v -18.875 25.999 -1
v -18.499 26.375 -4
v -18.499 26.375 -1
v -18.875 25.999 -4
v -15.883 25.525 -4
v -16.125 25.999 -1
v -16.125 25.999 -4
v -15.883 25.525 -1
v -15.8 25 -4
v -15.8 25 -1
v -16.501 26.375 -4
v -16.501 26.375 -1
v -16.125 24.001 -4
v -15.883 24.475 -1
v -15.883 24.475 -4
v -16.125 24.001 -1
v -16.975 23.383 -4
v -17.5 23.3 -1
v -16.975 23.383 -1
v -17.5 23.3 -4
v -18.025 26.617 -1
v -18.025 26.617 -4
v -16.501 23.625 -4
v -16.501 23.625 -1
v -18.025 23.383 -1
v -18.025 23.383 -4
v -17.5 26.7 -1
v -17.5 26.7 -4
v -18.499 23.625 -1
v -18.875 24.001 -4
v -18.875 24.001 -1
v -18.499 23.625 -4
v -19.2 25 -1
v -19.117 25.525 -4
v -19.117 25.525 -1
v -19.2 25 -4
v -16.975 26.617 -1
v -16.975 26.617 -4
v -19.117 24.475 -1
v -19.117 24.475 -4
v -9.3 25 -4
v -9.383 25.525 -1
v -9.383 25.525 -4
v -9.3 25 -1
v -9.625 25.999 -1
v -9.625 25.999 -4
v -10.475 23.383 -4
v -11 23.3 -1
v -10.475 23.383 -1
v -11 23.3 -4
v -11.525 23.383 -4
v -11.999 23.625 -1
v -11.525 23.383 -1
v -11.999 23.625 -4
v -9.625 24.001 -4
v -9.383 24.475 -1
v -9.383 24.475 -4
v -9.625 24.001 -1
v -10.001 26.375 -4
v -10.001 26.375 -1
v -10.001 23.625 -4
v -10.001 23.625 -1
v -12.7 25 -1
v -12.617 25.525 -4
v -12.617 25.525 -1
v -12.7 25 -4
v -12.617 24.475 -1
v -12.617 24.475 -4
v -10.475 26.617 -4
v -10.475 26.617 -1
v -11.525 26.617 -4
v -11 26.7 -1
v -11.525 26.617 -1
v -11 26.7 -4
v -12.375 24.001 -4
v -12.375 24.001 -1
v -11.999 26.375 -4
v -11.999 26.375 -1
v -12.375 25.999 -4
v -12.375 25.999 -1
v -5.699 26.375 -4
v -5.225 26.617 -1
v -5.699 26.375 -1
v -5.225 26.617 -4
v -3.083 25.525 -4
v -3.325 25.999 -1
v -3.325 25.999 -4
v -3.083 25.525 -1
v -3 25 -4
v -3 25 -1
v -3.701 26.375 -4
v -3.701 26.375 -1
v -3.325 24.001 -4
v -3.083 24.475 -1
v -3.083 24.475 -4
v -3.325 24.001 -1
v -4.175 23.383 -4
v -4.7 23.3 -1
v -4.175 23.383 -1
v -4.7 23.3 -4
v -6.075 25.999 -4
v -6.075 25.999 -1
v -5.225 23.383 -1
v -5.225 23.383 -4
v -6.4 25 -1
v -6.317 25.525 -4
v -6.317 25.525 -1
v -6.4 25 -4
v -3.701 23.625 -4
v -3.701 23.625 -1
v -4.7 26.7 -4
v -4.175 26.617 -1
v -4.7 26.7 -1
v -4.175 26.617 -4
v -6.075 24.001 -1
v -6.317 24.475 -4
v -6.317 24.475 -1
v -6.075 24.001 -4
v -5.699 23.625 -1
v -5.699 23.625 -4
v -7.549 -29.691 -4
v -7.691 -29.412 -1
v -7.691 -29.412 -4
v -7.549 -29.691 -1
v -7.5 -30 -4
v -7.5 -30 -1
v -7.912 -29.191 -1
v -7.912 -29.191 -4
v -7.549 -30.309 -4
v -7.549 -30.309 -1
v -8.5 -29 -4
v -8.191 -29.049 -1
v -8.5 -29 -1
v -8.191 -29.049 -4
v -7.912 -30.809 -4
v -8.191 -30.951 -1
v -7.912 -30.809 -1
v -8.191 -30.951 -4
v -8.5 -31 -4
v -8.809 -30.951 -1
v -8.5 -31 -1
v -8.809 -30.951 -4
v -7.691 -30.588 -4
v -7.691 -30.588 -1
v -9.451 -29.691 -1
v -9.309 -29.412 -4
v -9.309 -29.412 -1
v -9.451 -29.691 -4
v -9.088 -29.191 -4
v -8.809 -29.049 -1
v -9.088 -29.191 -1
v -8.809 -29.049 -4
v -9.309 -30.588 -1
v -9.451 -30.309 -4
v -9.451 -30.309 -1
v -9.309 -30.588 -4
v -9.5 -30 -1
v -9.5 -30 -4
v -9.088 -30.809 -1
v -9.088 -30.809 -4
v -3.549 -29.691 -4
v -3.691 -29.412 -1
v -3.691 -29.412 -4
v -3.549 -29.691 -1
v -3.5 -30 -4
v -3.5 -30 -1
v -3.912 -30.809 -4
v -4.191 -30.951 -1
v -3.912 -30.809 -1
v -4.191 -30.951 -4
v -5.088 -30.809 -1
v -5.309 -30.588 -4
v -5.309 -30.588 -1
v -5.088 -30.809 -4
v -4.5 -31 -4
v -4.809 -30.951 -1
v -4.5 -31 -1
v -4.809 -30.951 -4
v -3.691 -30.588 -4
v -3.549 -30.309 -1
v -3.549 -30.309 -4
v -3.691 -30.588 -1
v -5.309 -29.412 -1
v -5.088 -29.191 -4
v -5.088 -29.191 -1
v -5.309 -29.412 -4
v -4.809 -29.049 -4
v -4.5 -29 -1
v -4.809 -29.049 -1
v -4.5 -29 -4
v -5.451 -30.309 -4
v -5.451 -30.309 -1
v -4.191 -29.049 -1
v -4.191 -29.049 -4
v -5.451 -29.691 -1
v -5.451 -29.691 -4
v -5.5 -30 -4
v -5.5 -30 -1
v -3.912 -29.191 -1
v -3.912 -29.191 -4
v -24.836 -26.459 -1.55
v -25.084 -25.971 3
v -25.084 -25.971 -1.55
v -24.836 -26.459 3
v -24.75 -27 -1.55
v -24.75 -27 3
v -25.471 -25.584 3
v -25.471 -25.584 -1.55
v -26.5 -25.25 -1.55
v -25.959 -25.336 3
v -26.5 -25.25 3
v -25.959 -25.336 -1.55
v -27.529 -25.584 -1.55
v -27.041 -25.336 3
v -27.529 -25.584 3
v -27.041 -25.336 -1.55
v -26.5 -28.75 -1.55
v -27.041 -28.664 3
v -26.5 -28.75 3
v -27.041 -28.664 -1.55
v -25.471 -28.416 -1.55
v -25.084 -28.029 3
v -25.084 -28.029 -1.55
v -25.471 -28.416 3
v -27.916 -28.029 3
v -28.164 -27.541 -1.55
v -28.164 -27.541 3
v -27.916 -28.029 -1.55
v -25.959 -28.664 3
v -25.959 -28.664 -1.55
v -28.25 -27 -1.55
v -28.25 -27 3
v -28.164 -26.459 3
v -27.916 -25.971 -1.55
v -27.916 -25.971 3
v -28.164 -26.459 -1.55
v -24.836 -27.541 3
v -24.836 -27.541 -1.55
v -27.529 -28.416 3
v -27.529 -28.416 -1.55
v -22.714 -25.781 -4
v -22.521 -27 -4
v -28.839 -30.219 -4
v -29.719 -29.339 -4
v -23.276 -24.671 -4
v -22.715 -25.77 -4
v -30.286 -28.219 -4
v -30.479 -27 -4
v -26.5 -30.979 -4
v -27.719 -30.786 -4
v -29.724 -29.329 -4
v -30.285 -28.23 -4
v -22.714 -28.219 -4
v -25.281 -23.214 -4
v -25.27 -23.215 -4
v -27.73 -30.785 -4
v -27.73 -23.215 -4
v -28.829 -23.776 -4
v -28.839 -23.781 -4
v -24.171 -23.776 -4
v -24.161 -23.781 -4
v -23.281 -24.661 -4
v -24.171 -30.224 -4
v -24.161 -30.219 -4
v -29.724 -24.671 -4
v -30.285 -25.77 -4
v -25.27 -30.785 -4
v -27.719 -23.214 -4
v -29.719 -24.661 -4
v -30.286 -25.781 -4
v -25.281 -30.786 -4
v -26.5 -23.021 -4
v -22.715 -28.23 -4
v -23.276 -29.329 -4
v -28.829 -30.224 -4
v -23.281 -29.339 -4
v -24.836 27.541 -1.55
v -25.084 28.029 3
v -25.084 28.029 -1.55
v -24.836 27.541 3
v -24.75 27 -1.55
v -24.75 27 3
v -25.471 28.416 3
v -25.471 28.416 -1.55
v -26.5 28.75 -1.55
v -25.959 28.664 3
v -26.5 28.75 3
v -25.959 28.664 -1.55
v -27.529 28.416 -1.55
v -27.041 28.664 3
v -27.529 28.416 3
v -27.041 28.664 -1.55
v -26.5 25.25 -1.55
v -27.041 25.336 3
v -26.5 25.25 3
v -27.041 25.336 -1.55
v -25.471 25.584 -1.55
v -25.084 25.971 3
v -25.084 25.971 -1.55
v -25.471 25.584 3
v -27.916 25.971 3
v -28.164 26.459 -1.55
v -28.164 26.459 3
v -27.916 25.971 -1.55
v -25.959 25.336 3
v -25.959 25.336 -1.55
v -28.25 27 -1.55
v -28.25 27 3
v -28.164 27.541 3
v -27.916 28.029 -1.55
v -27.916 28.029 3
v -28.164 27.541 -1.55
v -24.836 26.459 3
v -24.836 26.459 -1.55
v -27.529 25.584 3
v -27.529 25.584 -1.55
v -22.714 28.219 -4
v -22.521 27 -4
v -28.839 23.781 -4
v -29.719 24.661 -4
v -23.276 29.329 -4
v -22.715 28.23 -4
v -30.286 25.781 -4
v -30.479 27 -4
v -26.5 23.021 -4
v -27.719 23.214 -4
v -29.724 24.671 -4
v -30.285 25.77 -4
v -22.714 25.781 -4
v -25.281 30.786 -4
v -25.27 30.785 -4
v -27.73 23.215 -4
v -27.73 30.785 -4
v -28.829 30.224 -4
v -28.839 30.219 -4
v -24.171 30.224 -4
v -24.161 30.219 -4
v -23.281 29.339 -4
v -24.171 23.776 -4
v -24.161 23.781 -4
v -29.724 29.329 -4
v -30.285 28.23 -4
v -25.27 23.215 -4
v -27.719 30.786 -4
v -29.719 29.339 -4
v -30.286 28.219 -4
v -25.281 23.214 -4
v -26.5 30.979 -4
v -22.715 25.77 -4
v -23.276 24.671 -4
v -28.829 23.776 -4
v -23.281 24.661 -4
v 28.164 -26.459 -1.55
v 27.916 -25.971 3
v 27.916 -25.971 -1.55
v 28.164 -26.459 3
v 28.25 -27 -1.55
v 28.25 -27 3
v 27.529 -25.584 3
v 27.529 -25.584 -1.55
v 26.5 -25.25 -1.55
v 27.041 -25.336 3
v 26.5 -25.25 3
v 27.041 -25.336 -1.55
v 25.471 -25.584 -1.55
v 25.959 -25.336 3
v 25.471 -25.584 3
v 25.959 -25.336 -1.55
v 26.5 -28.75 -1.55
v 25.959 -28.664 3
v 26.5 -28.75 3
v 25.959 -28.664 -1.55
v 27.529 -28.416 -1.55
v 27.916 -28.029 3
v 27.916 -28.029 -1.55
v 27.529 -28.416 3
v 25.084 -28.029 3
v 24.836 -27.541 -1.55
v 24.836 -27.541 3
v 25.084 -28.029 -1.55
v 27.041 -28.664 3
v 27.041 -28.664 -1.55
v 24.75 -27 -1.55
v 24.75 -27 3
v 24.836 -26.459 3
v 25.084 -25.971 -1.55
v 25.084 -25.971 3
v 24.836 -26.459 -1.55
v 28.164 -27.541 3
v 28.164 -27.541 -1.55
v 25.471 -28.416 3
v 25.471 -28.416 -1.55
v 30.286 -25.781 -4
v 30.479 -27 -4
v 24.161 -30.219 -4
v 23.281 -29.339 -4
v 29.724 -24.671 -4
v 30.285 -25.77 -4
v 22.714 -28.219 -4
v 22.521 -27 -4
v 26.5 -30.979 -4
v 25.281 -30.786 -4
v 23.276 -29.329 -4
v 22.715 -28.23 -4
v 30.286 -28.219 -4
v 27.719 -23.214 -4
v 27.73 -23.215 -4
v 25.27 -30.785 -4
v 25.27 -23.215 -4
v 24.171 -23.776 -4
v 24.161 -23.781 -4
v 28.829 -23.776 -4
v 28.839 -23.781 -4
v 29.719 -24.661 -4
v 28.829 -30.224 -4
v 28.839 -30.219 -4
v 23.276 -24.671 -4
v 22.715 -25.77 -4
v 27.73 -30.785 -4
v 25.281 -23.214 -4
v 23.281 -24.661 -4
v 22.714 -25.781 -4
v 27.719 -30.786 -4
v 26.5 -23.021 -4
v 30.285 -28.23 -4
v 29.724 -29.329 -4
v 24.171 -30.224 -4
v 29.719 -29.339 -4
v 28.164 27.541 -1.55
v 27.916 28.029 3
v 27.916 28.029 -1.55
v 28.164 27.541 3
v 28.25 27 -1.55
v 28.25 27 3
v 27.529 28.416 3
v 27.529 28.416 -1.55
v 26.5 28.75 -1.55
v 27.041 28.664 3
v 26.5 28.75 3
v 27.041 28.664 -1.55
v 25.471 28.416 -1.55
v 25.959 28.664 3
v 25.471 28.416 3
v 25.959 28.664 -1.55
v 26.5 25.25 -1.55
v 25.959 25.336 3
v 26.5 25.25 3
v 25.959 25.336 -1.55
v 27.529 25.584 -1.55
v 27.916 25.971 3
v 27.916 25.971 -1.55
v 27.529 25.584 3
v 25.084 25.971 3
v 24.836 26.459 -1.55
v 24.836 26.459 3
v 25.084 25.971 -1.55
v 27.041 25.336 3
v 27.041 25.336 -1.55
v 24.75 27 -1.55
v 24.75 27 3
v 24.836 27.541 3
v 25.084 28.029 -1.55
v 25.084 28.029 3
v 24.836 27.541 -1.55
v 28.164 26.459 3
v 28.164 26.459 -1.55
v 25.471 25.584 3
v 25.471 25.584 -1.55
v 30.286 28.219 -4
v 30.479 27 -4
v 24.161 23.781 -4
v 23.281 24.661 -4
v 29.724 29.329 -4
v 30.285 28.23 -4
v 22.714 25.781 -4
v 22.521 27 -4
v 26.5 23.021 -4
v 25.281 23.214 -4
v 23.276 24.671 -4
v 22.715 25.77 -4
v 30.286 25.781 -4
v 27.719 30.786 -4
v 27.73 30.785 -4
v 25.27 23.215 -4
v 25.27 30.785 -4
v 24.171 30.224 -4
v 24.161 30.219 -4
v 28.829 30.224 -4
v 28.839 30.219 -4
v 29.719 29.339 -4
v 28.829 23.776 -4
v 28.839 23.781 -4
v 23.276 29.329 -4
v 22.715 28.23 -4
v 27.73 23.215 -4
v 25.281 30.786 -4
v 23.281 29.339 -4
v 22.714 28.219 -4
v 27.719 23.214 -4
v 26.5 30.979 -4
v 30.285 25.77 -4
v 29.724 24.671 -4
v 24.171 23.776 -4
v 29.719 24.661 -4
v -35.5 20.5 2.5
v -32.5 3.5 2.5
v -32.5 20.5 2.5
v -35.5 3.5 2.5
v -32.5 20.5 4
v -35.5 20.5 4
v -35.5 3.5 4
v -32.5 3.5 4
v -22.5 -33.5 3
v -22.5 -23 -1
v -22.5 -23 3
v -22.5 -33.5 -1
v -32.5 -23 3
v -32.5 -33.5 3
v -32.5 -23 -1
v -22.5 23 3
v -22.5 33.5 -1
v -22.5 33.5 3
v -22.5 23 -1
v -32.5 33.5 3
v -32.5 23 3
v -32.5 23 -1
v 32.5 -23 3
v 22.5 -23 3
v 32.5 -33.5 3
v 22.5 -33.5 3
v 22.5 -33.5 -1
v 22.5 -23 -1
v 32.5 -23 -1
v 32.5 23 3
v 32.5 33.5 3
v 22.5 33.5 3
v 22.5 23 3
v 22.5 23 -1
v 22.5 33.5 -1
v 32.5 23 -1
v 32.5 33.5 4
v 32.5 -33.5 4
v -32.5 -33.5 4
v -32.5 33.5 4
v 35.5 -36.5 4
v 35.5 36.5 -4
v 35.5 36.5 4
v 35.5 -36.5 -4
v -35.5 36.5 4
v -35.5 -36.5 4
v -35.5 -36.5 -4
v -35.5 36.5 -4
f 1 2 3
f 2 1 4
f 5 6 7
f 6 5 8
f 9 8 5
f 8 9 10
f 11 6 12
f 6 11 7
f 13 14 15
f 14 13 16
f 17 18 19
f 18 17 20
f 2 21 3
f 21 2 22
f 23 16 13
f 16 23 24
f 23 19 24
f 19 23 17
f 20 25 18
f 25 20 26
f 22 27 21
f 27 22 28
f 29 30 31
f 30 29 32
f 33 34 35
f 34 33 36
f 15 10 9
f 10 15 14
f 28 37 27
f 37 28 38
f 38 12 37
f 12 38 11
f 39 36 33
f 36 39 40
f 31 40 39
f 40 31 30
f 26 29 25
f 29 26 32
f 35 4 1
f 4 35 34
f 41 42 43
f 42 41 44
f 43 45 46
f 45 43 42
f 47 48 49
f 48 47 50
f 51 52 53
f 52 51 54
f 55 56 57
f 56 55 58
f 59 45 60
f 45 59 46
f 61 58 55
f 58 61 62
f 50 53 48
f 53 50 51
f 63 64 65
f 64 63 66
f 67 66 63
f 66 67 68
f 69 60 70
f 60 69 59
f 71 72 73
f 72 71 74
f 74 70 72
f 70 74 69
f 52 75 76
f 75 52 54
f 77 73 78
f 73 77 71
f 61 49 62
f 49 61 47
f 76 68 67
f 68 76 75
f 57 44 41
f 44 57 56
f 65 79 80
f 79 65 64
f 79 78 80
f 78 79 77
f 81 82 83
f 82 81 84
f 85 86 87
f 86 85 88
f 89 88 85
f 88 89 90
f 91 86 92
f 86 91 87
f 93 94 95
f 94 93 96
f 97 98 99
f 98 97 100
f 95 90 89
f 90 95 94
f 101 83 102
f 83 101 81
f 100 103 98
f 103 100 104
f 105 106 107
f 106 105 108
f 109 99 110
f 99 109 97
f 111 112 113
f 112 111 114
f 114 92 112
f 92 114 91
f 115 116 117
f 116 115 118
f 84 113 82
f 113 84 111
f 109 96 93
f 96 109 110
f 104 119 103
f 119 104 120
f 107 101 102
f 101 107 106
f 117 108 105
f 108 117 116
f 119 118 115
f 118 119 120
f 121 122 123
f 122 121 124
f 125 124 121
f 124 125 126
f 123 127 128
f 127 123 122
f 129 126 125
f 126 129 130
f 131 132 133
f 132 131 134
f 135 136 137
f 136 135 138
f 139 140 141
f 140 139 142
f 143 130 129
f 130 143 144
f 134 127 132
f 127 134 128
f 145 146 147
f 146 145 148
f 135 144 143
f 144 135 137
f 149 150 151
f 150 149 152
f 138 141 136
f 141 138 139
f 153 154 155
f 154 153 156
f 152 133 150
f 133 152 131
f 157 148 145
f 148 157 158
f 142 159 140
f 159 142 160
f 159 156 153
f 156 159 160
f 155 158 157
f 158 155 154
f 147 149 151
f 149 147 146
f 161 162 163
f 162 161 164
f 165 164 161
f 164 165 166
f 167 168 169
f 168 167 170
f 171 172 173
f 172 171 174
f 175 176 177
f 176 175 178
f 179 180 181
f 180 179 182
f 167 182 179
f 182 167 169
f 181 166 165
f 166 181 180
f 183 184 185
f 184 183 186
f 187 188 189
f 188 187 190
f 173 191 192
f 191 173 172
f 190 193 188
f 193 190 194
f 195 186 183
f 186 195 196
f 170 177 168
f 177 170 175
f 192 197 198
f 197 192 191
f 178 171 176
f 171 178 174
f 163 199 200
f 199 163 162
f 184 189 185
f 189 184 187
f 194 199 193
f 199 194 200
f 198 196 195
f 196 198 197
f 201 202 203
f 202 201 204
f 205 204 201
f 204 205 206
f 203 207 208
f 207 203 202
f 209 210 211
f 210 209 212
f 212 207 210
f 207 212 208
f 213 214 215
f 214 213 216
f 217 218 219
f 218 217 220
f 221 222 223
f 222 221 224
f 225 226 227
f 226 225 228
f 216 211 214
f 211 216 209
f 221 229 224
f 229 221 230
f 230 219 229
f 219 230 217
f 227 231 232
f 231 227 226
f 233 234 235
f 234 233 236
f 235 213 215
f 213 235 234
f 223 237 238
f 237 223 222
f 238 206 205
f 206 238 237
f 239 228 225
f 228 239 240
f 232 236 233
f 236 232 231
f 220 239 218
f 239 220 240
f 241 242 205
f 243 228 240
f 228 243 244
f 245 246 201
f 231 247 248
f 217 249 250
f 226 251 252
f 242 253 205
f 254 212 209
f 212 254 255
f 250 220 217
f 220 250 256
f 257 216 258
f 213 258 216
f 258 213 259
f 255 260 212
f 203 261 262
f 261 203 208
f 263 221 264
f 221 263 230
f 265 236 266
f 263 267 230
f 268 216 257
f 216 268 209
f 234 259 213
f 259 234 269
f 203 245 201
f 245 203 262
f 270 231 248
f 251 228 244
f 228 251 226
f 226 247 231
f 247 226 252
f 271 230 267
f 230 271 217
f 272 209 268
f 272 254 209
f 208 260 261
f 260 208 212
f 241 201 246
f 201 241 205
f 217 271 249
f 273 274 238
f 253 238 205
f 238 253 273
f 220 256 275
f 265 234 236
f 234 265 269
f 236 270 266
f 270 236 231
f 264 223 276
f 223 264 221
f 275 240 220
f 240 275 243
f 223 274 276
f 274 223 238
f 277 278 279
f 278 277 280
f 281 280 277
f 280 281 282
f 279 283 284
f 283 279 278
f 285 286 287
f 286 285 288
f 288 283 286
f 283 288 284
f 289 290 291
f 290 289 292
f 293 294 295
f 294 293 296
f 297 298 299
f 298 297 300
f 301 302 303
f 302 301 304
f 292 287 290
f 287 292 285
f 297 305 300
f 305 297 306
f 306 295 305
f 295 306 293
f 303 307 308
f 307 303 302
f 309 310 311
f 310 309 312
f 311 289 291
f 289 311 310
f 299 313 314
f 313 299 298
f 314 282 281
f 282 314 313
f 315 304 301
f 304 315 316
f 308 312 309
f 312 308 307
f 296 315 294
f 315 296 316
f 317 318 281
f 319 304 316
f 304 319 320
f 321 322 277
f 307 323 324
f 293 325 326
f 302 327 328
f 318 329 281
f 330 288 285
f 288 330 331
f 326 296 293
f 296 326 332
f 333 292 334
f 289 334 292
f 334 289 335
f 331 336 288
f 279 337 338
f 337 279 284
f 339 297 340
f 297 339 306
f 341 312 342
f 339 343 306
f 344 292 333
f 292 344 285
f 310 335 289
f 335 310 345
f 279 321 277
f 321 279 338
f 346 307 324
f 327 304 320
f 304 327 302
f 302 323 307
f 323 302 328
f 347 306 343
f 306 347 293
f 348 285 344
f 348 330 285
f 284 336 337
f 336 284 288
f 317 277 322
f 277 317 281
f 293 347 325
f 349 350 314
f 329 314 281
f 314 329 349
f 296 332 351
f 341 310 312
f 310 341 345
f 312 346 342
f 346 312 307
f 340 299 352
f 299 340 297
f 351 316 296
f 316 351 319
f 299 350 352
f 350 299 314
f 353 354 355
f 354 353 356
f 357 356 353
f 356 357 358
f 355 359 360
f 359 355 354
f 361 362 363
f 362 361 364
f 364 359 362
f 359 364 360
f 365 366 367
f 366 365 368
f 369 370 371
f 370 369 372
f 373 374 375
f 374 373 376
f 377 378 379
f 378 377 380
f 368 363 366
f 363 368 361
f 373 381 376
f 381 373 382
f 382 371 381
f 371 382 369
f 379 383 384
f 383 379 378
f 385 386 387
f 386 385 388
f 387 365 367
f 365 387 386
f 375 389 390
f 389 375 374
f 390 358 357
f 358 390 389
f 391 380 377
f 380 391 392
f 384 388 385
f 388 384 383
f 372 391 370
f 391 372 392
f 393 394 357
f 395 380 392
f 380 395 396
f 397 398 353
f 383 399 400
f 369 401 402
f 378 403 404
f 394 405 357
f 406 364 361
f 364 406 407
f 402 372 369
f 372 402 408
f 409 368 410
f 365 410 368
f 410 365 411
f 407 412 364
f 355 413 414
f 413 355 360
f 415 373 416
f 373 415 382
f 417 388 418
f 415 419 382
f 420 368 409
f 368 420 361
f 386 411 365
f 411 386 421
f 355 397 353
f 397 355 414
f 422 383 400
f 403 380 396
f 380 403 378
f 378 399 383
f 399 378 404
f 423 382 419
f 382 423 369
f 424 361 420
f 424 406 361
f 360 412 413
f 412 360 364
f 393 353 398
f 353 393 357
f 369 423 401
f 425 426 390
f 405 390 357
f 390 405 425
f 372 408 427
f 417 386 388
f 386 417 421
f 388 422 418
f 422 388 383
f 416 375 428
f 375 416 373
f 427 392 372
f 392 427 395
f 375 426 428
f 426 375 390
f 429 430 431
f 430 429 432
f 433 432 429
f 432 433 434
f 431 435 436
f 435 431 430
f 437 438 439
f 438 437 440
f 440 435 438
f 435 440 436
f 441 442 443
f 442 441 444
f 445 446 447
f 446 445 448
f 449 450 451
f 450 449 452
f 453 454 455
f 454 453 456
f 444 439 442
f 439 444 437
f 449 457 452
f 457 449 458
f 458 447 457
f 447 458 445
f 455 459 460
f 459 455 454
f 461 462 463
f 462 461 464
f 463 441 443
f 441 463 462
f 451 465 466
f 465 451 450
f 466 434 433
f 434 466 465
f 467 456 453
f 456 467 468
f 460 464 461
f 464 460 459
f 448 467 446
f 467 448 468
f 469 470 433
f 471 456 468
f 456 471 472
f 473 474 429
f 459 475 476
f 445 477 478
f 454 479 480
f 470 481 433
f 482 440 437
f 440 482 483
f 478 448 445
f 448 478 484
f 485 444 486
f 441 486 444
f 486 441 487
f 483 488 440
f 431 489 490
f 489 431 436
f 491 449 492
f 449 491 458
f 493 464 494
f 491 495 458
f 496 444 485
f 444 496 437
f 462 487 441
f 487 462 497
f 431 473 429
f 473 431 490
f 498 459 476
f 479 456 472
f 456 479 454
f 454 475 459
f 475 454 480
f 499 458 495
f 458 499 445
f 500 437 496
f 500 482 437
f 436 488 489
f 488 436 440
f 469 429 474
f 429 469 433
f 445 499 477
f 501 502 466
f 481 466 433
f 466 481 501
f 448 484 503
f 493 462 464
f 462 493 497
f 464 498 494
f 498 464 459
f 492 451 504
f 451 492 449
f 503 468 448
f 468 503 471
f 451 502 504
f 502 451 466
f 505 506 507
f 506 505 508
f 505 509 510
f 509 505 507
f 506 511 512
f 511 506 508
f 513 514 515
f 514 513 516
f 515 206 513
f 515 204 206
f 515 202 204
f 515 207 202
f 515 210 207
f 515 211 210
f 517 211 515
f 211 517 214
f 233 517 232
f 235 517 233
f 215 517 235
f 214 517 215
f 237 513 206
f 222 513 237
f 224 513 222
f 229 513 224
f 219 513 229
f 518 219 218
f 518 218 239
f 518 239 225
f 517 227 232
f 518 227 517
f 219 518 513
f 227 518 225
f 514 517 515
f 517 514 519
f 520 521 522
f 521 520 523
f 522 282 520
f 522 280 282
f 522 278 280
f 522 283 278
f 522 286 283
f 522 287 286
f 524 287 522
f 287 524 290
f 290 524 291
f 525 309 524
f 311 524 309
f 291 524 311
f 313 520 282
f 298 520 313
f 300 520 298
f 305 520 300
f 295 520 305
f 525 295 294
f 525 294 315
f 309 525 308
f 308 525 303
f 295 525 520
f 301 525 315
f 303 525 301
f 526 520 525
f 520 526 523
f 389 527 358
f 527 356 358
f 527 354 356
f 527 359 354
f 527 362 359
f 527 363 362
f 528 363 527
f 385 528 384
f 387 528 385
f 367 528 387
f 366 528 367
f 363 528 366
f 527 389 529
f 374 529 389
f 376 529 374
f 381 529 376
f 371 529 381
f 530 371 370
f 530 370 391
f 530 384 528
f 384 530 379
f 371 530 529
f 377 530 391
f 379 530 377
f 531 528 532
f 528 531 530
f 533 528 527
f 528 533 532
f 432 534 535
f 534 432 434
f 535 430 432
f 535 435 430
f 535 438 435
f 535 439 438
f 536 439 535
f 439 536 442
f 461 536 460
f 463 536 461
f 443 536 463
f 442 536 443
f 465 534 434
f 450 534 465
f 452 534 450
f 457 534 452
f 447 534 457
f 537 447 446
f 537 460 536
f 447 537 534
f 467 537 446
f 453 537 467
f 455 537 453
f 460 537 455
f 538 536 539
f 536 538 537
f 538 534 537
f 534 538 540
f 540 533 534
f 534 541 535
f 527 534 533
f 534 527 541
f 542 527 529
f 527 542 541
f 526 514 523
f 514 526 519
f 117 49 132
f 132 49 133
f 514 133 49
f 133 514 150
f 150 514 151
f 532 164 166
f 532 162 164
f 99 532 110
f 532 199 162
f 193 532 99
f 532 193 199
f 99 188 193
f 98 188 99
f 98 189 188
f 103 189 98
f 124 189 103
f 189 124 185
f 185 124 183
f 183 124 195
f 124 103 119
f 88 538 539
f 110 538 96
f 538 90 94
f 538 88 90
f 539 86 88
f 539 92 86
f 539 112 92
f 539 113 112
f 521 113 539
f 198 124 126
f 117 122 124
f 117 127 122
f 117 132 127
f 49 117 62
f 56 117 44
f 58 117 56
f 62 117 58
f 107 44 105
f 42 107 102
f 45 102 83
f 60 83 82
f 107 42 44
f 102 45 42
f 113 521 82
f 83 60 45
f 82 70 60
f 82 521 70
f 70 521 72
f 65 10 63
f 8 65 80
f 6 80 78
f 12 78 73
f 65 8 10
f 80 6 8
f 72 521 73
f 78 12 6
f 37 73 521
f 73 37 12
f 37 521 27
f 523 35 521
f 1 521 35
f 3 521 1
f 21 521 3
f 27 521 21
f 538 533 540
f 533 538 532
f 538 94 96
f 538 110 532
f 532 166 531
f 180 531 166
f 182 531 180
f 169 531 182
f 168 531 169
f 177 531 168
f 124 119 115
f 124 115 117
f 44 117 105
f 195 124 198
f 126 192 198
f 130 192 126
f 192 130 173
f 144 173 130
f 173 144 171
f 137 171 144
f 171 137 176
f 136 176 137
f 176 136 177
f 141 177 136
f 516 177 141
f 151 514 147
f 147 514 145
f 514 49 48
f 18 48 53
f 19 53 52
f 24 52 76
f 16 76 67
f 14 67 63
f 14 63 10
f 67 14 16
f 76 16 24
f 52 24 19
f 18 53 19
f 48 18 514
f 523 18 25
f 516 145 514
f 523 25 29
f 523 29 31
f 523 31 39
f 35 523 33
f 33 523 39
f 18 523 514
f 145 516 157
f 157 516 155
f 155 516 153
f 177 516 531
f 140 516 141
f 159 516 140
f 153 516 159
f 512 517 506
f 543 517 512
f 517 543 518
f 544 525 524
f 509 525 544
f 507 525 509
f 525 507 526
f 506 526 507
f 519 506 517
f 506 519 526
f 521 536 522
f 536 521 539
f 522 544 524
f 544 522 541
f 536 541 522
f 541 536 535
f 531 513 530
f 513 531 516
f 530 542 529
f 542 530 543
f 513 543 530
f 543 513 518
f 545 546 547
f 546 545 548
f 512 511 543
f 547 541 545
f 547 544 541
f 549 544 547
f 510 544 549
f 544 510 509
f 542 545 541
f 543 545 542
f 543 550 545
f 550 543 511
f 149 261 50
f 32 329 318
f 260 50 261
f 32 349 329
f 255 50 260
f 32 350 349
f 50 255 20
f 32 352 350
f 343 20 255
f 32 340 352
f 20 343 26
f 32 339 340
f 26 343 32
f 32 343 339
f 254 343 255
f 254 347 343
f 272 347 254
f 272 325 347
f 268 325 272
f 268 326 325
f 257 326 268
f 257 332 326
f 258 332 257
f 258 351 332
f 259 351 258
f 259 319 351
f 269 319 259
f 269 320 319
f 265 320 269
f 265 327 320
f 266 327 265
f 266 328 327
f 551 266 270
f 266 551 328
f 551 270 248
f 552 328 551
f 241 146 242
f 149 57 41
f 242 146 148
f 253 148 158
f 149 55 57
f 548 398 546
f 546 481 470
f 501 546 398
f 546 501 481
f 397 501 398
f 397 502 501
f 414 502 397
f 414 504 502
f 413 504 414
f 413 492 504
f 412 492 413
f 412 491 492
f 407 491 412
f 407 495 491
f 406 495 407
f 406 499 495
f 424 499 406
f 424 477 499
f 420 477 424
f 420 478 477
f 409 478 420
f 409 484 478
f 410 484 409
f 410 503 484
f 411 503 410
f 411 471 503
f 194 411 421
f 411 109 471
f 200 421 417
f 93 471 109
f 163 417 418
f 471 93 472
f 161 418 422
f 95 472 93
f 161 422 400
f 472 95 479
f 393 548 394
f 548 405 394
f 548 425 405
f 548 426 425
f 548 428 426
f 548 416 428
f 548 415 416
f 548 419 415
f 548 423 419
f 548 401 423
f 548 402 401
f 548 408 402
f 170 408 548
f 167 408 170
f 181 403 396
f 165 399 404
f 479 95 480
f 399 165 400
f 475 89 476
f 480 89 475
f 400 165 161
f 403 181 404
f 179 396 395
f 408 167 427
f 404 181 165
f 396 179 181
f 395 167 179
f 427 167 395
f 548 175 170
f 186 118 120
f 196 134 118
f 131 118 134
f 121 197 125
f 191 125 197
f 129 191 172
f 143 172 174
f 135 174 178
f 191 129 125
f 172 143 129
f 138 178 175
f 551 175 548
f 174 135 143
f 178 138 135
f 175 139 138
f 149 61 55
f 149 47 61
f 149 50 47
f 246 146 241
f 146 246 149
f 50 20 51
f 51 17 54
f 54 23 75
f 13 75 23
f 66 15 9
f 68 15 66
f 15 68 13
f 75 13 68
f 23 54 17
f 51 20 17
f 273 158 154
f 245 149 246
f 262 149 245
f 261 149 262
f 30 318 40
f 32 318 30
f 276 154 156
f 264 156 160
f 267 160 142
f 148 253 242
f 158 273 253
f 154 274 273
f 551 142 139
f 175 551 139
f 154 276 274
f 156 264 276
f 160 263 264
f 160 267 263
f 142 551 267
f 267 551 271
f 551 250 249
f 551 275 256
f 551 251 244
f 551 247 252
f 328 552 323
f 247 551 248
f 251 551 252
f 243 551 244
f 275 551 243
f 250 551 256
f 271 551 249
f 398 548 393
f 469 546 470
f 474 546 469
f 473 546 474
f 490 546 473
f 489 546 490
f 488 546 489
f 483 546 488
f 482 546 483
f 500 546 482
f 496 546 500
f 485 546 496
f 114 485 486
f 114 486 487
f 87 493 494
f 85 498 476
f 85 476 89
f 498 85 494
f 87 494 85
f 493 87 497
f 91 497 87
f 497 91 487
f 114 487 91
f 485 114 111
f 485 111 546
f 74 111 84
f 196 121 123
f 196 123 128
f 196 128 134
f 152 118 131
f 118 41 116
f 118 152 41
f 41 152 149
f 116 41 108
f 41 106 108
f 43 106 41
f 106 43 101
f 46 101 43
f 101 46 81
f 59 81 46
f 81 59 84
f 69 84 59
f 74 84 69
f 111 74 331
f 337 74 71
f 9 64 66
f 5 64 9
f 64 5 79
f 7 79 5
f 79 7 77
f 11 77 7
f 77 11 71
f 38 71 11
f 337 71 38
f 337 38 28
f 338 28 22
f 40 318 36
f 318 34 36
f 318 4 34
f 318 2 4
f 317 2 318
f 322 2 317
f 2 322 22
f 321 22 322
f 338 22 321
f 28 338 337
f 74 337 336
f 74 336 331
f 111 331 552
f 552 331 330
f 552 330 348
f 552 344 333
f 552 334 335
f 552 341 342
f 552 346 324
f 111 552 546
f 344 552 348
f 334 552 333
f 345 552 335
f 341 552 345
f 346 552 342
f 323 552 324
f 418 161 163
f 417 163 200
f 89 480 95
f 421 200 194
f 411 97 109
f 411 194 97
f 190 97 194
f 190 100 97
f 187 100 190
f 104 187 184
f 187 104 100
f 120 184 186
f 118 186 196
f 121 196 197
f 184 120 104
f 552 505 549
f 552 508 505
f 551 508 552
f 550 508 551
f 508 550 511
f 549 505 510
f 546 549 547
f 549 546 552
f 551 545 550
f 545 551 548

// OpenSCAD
//cubex=120; //71;
//cubey=130; //73;
cubex=71;
cubey=73;
xcen = cubex-18;
ycen = cubey-19;
dia = 3.5;
thick=8;
lid=true;
ribbonNotch=true;
//offx=cubex/2-71/2;
//offy=cubey/2-73/2;
offx = 0;
offy=0;

case();



module slot()
{
	translate([dia,0,0])
		cylinder(r=dia/2,h=60, center=true,$fn=20);
	translate([-dia,0,0])
		cylinder(r=dia/2,h=60, center=true,$fn=20);
	cube([2*dia,dia,60],center=true);	
}

module corner(box, rr)
{
	translate([offx, offy, 0])
	{
	for(x=[-1,1])for(y=[-1,1])
		translate([x*xcen/2,y*ycen/2,0])
		{
			if(box)
			{
				translate([2*x,2*y,-1])
					cube([12,12,thick], center=true);
			} else
			{
				cylinder(r=rr, h=40, center=true, $fn=20);
				if(lid)
				{
				translate([0,0,-thick/4-0.8])
				cylinder(r1=2.3*rr, r2=rr, h=2.5, center=true, $fn=20);
				}
			}
		}
}
}

module case()
{

difference()
{
	translate([offx, offy, 0])
		cube([cubex,cubey,thick], center=true);


	if(lid)
	{
		translate([-xcen/2,ycen/2,0])
		{
			translate([9,-2,0])
				cylinder(r=1.7, h=40, center=true, $fn=20);
			translate([9+6.5,-2,0])
			cylinder(r=1.7, h=40, center=true, $fn=20);
			translate([9+6.5+6.3,-2,0])
			cylinder(r=1.7, h=40, center=true, $fn=20);
		}
		translate([20-xcen/2,-ycen/2-3,0])
		{
			translate([-2,0,0])
					cylinder(r=1, h=40, center=true, $fn=20);
			translate([2,0,0])
			cylinder(r=1, h=40, center=true, $fn=20);
		}
		corner(box=false, rr=dia/2);
		if(ribbonNotch)
		{
			translate([-xcen/2-5,12,7.5])
				cube([10,17,10], center=true);
		}
	} else
	{
		translate([xcen/2,-ycen/2,12.5-1-4])
		{
			translate([-30,-2,0])
				rotate([90,0,0])
					cylinder(r=2.5, h=40, center=true, $fn=20);

			translate([-30+10+10,-2,0])
				rotate([90,0,0])
					cylinder(r=2.5, h=40, center=true, $fn=20);
		}

		translate([-xcen/2,ycen/2,12.5-14])
					translate([30-10,-2,0])
				rotate([90,0,0])
					cylinder(r=1, h=40, center=true, $fn=20);

		translate([xcen/4,-ycen/4,0])
			slot();
		translate([-xcen/4,ycen/4,0])
			rotate([0,0,90])
				slot();
		corner(box=false, rr=0.8*dia/2);
	}


translate([offx, offy, 0])
	difference()
	{
		translate([0,0,3])
		cube([cubex-6,cubey-6,thick], center=true, r=dia/2);
		corner(box=true, rr=dia/2);
	}

}

}
